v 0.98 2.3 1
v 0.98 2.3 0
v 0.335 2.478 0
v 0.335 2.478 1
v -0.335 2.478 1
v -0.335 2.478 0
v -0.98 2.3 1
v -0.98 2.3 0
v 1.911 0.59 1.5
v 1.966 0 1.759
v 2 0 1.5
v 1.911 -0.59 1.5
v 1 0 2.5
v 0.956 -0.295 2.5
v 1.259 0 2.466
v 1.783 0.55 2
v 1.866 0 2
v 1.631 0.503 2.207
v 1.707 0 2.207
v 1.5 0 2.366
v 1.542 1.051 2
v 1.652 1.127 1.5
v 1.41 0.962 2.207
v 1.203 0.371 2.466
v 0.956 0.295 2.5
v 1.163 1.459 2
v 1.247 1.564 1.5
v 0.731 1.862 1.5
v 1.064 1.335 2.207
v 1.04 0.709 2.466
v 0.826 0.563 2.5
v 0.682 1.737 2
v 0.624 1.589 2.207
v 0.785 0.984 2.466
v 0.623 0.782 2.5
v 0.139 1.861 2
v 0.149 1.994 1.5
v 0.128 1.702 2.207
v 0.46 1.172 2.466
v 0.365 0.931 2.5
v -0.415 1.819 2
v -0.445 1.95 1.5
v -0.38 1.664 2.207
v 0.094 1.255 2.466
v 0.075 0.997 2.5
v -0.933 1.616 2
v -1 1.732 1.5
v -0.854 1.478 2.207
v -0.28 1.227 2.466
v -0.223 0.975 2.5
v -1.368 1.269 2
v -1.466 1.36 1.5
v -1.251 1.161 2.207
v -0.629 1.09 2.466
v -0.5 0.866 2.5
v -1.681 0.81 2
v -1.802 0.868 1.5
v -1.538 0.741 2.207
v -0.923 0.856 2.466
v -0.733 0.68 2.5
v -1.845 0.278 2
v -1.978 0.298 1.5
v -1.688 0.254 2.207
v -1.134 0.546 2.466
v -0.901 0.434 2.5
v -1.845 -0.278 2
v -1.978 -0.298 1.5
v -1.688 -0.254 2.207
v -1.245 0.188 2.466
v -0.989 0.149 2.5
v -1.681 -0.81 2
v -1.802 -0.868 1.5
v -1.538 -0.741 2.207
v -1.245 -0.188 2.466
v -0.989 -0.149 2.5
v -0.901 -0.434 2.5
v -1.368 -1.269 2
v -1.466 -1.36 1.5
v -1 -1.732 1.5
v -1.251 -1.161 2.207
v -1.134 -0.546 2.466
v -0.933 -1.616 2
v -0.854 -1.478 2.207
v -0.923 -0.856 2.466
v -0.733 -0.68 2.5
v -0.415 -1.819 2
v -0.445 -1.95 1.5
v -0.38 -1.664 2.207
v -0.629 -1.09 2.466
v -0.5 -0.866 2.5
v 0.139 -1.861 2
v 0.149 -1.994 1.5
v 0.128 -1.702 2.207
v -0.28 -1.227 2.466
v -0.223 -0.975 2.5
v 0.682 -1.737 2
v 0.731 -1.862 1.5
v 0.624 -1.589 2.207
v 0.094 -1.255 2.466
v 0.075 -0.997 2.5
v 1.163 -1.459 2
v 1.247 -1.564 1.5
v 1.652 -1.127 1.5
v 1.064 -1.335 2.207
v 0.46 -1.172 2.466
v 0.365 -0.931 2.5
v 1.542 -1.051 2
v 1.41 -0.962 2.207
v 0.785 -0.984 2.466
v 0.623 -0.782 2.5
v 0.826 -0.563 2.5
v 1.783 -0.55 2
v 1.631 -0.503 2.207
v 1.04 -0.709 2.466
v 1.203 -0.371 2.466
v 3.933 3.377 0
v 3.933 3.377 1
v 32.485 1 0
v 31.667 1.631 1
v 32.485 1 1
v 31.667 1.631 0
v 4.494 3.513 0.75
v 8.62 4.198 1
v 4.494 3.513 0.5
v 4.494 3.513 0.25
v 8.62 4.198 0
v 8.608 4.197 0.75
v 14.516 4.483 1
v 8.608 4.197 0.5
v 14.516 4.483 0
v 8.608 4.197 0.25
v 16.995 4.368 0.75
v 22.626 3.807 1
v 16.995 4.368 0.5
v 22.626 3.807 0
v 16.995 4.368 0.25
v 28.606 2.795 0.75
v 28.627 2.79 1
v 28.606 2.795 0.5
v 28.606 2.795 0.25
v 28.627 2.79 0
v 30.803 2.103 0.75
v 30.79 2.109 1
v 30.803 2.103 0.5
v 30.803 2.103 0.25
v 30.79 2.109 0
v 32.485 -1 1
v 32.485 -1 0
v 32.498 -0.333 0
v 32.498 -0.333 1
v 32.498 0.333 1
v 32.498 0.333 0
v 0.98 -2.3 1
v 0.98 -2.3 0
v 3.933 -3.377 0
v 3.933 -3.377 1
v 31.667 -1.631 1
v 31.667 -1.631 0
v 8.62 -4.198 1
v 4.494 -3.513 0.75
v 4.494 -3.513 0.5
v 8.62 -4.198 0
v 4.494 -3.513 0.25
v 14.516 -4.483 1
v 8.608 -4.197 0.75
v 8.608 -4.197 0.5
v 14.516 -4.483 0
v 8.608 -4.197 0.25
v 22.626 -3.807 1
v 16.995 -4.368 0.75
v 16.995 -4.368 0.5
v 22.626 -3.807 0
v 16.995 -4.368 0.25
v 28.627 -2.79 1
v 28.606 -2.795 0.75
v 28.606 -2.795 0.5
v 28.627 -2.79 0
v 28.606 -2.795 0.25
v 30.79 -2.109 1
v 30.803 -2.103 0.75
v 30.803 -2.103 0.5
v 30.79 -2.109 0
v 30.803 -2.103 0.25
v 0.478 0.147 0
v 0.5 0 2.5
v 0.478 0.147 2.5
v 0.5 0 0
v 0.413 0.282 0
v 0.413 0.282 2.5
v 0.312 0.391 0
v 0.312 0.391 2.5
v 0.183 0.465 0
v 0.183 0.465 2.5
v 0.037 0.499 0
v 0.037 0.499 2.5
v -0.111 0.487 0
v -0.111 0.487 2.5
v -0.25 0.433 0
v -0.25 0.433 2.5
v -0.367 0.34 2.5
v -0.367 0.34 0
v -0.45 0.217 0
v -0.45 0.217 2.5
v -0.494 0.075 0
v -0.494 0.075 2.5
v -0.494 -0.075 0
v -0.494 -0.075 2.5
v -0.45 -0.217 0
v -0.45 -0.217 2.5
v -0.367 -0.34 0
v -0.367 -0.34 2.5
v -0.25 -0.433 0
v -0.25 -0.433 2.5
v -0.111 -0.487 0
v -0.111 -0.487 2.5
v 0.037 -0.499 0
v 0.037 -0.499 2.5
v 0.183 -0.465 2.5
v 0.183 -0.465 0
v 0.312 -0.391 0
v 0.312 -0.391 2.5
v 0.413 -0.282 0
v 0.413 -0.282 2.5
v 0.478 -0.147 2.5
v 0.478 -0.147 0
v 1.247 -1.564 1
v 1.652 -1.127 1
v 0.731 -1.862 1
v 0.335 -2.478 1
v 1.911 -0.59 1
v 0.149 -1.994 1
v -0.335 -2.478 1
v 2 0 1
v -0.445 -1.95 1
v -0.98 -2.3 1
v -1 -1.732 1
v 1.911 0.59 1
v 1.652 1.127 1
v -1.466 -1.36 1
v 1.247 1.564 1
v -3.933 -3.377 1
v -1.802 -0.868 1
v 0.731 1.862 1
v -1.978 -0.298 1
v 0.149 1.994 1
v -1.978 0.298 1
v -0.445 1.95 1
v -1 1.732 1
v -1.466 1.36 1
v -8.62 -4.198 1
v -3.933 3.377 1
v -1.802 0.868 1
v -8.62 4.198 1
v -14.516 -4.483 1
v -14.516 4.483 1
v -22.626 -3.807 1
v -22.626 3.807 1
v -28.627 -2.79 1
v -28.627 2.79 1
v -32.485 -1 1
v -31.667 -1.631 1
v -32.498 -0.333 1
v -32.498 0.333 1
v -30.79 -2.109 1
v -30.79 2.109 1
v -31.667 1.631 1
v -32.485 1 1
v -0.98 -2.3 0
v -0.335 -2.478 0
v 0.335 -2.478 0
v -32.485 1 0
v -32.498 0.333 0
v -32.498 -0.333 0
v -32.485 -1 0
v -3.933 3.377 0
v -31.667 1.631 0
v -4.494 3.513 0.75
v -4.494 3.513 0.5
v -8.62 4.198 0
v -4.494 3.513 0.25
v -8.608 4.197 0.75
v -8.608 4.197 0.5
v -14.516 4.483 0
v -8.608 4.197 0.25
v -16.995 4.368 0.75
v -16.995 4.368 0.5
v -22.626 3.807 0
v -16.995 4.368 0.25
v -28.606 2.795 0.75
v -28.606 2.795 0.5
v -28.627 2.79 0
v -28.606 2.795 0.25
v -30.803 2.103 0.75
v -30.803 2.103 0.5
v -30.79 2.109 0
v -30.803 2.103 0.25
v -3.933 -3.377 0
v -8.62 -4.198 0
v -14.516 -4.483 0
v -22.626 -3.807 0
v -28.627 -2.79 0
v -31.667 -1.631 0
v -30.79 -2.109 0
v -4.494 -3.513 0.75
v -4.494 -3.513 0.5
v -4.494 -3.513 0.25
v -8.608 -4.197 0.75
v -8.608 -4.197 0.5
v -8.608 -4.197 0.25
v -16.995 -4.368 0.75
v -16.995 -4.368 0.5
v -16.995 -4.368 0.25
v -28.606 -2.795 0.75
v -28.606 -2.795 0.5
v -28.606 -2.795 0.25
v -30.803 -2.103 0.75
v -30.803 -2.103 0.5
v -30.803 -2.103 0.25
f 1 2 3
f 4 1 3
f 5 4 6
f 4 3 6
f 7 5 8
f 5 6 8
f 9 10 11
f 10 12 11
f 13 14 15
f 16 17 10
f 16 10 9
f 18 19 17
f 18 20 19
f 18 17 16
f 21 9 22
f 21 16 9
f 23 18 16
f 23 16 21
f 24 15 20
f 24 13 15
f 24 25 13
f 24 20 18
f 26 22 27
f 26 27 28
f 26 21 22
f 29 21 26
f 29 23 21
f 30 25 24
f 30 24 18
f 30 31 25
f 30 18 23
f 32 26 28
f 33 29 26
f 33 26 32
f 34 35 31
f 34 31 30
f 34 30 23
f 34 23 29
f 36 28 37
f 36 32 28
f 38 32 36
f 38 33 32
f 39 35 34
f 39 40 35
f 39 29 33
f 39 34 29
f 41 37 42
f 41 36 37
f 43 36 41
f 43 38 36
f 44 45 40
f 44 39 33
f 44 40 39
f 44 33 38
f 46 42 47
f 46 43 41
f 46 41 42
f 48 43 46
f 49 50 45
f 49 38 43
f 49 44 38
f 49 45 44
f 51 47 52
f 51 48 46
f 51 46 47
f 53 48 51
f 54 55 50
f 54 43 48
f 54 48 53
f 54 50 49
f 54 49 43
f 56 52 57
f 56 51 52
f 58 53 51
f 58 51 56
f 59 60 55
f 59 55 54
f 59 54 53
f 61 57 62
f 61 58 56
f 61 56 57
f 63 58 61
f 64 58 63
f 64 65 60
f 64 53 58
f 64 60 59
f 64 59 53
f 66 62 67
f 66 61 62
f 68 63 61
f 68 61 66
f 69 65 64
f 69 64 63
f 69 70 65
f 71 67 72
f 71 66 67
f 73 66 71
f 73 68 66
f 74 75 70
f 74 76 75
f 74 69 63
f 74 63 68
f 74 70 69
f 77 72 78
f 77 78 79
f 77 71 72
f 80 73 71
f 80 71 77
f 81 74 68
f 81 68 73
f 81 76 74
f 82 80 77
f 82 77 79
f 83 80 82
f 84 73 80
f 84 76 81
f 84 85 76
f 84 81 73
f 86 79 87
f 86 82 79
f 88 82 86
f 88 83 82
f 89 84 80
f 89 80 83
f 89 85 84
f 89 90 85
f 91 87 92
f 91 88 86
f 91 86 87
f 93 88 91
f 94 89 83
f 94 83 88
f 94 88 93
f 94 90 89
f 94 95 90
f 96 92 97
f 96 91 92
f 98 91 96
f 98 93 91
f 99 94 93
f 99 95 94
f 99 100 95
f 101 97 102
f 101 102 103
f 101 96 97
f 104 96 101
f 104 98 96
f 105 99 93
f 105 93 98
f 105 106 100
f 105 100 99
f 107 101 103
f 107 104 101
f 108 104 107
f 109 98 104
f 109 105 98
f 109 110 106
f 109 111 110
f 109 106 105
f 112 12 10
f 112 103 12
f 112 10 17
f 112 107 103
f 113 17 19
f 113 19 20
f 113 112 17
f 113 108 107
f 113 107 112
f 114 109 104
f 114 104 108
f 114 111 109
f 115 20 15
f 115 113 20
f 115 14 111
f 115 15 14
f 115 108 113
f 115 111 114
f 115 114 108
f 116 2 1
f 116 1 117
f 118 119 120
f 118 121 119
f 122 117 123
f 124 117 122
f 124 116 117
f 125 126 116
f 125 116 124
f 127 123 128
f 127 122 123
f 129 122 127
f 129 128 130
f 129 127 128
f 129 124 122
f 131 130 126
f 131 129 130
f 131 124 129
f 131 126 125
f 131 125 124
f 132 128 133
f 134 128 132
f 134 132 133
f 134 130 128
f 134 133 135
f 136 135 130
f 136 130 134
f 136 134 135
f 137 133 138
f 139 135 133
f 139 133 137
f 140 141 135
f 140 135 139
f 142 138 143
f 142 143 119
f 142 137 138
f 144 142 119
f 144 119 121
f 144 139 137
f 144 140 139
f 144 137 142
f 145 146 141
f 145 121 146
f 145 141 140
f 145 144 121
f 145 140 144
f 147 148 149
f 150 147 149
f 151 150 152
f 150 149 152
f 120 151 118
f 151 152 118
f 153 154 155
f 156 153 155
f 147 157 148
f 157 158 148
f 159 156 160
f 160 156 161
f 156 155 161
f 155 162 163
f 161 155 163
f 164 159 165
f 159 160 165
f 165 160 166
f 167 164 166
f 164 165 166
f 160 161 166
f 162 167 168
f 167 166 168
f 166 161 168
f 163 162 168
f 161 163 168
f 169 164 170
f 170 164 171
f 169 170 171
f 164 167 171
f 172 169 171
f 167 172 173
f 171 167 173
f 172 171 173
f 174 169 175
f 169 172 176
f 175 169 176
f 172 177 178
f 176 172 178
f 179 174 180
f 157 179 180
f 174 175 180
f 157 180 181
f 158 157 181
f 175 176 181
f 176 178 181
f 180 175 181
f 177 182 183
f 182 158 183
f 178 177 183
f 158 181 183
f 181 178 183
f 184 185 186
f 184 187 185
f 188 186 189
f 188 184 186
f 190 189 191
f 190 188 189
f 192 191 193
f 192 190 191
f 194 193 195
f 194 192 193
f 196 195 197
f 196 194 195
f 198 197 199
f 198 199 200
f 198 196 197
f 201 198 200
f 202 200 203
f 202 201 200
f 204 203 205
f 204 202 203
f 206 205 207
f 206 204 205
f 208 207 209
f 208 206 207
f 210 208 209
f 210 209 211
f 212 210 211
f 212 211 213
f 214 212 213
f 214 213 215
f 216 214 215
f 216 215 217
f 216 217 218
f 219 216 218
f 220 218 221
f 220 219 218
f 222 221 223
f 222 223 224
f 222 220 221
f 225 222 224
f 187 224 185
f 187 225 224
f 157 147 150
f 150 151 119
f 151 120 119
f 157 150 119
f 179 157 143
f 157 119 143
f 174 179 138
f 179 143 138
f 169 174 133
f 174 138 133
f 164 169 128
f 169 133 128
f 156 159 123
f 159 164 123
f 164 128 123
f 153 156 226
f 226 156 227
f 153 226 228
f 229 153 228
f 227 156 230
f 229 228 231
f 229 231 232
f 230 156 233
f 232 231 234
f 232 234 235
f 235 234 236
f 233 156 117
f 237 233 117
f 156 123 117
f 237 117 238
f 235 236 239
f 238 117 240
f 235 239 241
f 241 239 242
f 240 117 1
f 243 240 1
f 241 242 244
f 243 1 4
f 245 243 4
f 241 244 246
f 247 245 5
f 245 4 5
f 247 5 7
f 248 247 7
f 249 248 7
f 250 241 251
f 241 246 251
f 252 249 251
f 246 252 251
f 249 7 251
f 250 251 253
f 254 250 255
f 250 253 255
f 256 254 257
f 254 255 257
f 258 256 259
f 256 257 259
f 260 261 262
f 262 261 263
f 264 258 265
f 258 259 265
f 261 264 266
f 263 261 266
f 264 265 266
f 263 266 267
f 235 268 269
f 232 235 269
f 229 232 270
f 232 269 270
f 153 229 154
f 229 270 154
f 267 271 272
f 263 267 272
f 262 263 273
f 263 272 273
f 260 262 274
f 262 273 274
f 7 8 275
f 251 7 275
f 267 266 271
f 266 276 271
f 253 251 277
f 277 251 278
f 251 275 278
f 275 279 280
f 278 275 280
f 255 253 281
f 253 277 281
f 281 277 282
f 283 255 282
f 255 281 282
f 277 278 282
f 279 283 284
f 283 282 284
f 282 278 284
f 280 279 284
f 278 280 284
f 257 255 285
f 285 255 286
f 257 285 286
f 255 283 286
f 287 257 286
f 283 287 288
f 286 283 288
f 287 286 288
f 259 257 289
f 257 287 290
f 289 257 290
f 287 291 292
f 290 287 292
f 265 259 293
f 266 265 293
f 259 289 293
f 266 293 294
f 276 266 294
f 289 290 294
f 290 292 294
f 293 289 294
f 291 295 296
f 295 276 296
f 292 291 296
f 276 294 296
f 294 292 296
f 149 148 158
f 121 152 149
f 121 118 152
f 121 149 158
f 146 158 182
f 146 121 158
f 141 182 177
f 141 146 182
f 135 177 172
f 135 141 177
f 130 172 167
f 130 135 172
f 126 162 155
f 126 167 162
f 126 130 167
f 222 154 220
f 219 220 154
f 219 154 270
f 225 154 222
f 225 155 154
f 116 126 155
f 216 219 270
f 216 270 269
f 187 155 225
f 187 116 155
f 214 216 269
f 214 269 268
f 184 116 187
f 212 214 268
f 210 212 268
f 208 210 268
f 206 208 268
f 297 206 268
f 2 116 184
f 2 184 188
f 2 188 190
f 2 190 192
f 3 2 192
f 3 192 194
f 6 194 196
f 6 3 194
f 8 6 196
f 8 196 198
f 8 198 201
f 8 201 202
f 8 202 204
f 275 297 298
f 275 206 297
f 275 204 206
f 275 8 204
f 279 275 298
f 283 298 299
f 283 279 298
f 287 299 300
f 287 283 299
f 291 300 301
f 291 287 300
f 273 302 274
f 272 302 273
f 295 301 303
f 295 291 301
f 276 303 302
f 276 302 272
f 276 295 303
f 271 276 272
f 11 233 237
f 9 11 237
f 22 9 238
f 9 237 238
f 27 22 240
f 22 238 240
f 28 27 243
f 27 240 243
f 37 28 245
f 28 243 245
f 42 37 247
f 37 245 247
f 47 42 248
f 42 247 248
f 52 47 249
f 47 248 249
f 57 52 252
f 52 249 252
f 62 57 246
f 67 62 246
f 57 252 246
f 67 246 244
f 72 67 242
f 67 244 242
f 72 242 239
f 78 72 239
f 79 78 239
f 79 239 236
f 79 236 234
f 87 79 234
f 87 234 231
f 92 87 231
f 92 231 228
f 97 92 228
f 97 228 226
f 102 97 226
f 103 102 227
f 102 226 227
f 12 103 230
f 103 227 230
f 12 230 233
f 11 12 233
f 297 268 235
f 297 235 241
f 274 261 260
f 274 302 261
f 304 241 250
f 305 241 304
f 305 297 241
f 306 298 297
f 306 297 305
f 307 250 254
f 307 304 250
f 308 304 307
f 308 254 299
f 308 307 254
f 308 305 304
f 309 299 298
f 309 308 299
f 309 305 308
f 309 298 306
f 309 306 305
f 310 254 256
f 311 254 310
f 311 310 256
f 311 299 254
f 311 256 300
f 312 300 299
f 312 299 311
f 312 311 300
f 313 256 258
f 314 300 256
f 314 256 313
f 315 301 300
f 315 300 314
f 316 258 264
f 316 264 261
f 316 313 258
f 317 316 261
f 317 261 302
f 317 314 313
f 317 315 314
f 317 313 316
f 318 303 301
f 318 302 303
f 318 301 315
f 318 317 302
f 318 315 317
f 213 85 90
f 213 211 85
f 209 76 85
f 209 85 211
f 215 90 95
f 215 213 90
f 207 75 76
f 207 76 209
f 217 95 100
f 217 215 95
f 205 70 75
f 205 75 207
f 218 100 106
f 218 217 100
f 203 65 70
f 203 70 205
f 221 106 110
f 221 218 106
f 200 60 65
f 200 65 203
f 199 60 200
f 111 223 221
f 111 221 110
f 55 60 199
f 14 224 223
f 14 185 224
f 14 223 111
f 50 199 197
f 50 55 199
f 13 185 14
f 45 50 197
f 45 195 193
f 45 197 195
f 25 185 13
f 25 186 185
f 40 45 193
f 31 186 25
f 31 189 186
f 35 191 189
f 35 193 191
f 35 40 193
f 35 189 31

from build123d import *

# Parameters (mm, degrees)
F0_R     = 0.5
F1_DEPTH = 1
F2_R     = 2
F2_R_2   = 0.5
F3_DEPTH = 1.5
F4_R     = 1


with BuildPart() as f1:
    # F0 (on Top) → F1 (new body)
    with BuildSketch(Plane.XY):
        with BuildLine():
            add(Edge.make_bspline(
                [(-0.9797958971, -2.3), (-2.8701558238, -3.3193906957), (-9.0635427866, -4.4634802029), (-16.6306103232, -4.6553743194), (-28.6483211521, -3.0888591027), (-31.4092017669, -1.9584880561), (-32.4846117416, -1)],
                knots=[0, 0, 0, 0, 0.2505517534, 0.5093635228, 0.8152612188, 1, 1, 1, 1], degree=3))
            ThreePointArc((-0.9797958971, -2.3), (0, -2.5), (0.9797958971, -2.3))
            add(Edge.make_bspline(
                [(0.9797958971, -2.3), (2.8701558238, -3.3193906957), (9.0635427866, -4.4634802029), (16.6306103232, -4.6553743194), (28.6483211521, -3.0888591027), (31.4092017669, -1.9584880561), (32.4846117416, -1)],
                knots=[0, 0, 0, 0, 0.2505517534, 0.5093635228, 0.8152612188, 1, 1, 1, 1], degree=3))
            ThreePointArc((32.4846117416, -1), (32.5, 0), (32.4846117416, 1))
            add(Edge.make_bspline(
                [(0.9797958971, 2.3), (2.8701558238, 3.3193906957), (9.0635427866, 4.4634802029), (16.6306103232, 4.6553743194), (28.6483211521, 3.0888591027), (31.4092017669, 1.9584880561), (32.4846117416, 1)],
                knots=[0, 0, 0, 0, 0.2505517534, 0.5093635228, 0.8152612188, 1, 1, 1, 1], degree=3))
            ThreePointArc((0.9797958971, 2.3), (0, 2.5), (-0.9797958971, 2.3))
            add(Edge.make_bspline(
                [(-0.9797958971, 2.3), (-2.8701558238, 3.3193906957), (-9.0635427866, 4.4634802029), (-16.6306103232, 4.6553743194), (-28.6483211521, 3.0888591027), (-31.4092017669, 1.9584880561), (-32.4846117416, 1)],
                knots=[0, 0, 0, 0, 0.2505517534, 0.5093635228, 0.8152612188, 1, 1, 1, 1], degree=3))
            ThreePointArc((-32.4846117416, 1), (-32.5, 0), (-32.4846117416, -1))
        make_face()
        Circle(F0_R, mode=Mode.SUBTRACT)
    extrude(amount=F1_DEPTH)

    # F2 (on face) → F3 (join)
    with BuildSketch(Plane.XY.offset(1)):
        Circle(F2_R)
        Circle(F2_R_2, mode=Mode.SUBTRACT)
    extrude(amount=F3_DEPTH)

    # F4
    f4_edges = [f1.edges().sort_by_distance(p)[0] for p in [
        (-2, 0, 2.5),
    ]]
    fillet(f4_edges, radius=F4_R)


solid = f1.part
